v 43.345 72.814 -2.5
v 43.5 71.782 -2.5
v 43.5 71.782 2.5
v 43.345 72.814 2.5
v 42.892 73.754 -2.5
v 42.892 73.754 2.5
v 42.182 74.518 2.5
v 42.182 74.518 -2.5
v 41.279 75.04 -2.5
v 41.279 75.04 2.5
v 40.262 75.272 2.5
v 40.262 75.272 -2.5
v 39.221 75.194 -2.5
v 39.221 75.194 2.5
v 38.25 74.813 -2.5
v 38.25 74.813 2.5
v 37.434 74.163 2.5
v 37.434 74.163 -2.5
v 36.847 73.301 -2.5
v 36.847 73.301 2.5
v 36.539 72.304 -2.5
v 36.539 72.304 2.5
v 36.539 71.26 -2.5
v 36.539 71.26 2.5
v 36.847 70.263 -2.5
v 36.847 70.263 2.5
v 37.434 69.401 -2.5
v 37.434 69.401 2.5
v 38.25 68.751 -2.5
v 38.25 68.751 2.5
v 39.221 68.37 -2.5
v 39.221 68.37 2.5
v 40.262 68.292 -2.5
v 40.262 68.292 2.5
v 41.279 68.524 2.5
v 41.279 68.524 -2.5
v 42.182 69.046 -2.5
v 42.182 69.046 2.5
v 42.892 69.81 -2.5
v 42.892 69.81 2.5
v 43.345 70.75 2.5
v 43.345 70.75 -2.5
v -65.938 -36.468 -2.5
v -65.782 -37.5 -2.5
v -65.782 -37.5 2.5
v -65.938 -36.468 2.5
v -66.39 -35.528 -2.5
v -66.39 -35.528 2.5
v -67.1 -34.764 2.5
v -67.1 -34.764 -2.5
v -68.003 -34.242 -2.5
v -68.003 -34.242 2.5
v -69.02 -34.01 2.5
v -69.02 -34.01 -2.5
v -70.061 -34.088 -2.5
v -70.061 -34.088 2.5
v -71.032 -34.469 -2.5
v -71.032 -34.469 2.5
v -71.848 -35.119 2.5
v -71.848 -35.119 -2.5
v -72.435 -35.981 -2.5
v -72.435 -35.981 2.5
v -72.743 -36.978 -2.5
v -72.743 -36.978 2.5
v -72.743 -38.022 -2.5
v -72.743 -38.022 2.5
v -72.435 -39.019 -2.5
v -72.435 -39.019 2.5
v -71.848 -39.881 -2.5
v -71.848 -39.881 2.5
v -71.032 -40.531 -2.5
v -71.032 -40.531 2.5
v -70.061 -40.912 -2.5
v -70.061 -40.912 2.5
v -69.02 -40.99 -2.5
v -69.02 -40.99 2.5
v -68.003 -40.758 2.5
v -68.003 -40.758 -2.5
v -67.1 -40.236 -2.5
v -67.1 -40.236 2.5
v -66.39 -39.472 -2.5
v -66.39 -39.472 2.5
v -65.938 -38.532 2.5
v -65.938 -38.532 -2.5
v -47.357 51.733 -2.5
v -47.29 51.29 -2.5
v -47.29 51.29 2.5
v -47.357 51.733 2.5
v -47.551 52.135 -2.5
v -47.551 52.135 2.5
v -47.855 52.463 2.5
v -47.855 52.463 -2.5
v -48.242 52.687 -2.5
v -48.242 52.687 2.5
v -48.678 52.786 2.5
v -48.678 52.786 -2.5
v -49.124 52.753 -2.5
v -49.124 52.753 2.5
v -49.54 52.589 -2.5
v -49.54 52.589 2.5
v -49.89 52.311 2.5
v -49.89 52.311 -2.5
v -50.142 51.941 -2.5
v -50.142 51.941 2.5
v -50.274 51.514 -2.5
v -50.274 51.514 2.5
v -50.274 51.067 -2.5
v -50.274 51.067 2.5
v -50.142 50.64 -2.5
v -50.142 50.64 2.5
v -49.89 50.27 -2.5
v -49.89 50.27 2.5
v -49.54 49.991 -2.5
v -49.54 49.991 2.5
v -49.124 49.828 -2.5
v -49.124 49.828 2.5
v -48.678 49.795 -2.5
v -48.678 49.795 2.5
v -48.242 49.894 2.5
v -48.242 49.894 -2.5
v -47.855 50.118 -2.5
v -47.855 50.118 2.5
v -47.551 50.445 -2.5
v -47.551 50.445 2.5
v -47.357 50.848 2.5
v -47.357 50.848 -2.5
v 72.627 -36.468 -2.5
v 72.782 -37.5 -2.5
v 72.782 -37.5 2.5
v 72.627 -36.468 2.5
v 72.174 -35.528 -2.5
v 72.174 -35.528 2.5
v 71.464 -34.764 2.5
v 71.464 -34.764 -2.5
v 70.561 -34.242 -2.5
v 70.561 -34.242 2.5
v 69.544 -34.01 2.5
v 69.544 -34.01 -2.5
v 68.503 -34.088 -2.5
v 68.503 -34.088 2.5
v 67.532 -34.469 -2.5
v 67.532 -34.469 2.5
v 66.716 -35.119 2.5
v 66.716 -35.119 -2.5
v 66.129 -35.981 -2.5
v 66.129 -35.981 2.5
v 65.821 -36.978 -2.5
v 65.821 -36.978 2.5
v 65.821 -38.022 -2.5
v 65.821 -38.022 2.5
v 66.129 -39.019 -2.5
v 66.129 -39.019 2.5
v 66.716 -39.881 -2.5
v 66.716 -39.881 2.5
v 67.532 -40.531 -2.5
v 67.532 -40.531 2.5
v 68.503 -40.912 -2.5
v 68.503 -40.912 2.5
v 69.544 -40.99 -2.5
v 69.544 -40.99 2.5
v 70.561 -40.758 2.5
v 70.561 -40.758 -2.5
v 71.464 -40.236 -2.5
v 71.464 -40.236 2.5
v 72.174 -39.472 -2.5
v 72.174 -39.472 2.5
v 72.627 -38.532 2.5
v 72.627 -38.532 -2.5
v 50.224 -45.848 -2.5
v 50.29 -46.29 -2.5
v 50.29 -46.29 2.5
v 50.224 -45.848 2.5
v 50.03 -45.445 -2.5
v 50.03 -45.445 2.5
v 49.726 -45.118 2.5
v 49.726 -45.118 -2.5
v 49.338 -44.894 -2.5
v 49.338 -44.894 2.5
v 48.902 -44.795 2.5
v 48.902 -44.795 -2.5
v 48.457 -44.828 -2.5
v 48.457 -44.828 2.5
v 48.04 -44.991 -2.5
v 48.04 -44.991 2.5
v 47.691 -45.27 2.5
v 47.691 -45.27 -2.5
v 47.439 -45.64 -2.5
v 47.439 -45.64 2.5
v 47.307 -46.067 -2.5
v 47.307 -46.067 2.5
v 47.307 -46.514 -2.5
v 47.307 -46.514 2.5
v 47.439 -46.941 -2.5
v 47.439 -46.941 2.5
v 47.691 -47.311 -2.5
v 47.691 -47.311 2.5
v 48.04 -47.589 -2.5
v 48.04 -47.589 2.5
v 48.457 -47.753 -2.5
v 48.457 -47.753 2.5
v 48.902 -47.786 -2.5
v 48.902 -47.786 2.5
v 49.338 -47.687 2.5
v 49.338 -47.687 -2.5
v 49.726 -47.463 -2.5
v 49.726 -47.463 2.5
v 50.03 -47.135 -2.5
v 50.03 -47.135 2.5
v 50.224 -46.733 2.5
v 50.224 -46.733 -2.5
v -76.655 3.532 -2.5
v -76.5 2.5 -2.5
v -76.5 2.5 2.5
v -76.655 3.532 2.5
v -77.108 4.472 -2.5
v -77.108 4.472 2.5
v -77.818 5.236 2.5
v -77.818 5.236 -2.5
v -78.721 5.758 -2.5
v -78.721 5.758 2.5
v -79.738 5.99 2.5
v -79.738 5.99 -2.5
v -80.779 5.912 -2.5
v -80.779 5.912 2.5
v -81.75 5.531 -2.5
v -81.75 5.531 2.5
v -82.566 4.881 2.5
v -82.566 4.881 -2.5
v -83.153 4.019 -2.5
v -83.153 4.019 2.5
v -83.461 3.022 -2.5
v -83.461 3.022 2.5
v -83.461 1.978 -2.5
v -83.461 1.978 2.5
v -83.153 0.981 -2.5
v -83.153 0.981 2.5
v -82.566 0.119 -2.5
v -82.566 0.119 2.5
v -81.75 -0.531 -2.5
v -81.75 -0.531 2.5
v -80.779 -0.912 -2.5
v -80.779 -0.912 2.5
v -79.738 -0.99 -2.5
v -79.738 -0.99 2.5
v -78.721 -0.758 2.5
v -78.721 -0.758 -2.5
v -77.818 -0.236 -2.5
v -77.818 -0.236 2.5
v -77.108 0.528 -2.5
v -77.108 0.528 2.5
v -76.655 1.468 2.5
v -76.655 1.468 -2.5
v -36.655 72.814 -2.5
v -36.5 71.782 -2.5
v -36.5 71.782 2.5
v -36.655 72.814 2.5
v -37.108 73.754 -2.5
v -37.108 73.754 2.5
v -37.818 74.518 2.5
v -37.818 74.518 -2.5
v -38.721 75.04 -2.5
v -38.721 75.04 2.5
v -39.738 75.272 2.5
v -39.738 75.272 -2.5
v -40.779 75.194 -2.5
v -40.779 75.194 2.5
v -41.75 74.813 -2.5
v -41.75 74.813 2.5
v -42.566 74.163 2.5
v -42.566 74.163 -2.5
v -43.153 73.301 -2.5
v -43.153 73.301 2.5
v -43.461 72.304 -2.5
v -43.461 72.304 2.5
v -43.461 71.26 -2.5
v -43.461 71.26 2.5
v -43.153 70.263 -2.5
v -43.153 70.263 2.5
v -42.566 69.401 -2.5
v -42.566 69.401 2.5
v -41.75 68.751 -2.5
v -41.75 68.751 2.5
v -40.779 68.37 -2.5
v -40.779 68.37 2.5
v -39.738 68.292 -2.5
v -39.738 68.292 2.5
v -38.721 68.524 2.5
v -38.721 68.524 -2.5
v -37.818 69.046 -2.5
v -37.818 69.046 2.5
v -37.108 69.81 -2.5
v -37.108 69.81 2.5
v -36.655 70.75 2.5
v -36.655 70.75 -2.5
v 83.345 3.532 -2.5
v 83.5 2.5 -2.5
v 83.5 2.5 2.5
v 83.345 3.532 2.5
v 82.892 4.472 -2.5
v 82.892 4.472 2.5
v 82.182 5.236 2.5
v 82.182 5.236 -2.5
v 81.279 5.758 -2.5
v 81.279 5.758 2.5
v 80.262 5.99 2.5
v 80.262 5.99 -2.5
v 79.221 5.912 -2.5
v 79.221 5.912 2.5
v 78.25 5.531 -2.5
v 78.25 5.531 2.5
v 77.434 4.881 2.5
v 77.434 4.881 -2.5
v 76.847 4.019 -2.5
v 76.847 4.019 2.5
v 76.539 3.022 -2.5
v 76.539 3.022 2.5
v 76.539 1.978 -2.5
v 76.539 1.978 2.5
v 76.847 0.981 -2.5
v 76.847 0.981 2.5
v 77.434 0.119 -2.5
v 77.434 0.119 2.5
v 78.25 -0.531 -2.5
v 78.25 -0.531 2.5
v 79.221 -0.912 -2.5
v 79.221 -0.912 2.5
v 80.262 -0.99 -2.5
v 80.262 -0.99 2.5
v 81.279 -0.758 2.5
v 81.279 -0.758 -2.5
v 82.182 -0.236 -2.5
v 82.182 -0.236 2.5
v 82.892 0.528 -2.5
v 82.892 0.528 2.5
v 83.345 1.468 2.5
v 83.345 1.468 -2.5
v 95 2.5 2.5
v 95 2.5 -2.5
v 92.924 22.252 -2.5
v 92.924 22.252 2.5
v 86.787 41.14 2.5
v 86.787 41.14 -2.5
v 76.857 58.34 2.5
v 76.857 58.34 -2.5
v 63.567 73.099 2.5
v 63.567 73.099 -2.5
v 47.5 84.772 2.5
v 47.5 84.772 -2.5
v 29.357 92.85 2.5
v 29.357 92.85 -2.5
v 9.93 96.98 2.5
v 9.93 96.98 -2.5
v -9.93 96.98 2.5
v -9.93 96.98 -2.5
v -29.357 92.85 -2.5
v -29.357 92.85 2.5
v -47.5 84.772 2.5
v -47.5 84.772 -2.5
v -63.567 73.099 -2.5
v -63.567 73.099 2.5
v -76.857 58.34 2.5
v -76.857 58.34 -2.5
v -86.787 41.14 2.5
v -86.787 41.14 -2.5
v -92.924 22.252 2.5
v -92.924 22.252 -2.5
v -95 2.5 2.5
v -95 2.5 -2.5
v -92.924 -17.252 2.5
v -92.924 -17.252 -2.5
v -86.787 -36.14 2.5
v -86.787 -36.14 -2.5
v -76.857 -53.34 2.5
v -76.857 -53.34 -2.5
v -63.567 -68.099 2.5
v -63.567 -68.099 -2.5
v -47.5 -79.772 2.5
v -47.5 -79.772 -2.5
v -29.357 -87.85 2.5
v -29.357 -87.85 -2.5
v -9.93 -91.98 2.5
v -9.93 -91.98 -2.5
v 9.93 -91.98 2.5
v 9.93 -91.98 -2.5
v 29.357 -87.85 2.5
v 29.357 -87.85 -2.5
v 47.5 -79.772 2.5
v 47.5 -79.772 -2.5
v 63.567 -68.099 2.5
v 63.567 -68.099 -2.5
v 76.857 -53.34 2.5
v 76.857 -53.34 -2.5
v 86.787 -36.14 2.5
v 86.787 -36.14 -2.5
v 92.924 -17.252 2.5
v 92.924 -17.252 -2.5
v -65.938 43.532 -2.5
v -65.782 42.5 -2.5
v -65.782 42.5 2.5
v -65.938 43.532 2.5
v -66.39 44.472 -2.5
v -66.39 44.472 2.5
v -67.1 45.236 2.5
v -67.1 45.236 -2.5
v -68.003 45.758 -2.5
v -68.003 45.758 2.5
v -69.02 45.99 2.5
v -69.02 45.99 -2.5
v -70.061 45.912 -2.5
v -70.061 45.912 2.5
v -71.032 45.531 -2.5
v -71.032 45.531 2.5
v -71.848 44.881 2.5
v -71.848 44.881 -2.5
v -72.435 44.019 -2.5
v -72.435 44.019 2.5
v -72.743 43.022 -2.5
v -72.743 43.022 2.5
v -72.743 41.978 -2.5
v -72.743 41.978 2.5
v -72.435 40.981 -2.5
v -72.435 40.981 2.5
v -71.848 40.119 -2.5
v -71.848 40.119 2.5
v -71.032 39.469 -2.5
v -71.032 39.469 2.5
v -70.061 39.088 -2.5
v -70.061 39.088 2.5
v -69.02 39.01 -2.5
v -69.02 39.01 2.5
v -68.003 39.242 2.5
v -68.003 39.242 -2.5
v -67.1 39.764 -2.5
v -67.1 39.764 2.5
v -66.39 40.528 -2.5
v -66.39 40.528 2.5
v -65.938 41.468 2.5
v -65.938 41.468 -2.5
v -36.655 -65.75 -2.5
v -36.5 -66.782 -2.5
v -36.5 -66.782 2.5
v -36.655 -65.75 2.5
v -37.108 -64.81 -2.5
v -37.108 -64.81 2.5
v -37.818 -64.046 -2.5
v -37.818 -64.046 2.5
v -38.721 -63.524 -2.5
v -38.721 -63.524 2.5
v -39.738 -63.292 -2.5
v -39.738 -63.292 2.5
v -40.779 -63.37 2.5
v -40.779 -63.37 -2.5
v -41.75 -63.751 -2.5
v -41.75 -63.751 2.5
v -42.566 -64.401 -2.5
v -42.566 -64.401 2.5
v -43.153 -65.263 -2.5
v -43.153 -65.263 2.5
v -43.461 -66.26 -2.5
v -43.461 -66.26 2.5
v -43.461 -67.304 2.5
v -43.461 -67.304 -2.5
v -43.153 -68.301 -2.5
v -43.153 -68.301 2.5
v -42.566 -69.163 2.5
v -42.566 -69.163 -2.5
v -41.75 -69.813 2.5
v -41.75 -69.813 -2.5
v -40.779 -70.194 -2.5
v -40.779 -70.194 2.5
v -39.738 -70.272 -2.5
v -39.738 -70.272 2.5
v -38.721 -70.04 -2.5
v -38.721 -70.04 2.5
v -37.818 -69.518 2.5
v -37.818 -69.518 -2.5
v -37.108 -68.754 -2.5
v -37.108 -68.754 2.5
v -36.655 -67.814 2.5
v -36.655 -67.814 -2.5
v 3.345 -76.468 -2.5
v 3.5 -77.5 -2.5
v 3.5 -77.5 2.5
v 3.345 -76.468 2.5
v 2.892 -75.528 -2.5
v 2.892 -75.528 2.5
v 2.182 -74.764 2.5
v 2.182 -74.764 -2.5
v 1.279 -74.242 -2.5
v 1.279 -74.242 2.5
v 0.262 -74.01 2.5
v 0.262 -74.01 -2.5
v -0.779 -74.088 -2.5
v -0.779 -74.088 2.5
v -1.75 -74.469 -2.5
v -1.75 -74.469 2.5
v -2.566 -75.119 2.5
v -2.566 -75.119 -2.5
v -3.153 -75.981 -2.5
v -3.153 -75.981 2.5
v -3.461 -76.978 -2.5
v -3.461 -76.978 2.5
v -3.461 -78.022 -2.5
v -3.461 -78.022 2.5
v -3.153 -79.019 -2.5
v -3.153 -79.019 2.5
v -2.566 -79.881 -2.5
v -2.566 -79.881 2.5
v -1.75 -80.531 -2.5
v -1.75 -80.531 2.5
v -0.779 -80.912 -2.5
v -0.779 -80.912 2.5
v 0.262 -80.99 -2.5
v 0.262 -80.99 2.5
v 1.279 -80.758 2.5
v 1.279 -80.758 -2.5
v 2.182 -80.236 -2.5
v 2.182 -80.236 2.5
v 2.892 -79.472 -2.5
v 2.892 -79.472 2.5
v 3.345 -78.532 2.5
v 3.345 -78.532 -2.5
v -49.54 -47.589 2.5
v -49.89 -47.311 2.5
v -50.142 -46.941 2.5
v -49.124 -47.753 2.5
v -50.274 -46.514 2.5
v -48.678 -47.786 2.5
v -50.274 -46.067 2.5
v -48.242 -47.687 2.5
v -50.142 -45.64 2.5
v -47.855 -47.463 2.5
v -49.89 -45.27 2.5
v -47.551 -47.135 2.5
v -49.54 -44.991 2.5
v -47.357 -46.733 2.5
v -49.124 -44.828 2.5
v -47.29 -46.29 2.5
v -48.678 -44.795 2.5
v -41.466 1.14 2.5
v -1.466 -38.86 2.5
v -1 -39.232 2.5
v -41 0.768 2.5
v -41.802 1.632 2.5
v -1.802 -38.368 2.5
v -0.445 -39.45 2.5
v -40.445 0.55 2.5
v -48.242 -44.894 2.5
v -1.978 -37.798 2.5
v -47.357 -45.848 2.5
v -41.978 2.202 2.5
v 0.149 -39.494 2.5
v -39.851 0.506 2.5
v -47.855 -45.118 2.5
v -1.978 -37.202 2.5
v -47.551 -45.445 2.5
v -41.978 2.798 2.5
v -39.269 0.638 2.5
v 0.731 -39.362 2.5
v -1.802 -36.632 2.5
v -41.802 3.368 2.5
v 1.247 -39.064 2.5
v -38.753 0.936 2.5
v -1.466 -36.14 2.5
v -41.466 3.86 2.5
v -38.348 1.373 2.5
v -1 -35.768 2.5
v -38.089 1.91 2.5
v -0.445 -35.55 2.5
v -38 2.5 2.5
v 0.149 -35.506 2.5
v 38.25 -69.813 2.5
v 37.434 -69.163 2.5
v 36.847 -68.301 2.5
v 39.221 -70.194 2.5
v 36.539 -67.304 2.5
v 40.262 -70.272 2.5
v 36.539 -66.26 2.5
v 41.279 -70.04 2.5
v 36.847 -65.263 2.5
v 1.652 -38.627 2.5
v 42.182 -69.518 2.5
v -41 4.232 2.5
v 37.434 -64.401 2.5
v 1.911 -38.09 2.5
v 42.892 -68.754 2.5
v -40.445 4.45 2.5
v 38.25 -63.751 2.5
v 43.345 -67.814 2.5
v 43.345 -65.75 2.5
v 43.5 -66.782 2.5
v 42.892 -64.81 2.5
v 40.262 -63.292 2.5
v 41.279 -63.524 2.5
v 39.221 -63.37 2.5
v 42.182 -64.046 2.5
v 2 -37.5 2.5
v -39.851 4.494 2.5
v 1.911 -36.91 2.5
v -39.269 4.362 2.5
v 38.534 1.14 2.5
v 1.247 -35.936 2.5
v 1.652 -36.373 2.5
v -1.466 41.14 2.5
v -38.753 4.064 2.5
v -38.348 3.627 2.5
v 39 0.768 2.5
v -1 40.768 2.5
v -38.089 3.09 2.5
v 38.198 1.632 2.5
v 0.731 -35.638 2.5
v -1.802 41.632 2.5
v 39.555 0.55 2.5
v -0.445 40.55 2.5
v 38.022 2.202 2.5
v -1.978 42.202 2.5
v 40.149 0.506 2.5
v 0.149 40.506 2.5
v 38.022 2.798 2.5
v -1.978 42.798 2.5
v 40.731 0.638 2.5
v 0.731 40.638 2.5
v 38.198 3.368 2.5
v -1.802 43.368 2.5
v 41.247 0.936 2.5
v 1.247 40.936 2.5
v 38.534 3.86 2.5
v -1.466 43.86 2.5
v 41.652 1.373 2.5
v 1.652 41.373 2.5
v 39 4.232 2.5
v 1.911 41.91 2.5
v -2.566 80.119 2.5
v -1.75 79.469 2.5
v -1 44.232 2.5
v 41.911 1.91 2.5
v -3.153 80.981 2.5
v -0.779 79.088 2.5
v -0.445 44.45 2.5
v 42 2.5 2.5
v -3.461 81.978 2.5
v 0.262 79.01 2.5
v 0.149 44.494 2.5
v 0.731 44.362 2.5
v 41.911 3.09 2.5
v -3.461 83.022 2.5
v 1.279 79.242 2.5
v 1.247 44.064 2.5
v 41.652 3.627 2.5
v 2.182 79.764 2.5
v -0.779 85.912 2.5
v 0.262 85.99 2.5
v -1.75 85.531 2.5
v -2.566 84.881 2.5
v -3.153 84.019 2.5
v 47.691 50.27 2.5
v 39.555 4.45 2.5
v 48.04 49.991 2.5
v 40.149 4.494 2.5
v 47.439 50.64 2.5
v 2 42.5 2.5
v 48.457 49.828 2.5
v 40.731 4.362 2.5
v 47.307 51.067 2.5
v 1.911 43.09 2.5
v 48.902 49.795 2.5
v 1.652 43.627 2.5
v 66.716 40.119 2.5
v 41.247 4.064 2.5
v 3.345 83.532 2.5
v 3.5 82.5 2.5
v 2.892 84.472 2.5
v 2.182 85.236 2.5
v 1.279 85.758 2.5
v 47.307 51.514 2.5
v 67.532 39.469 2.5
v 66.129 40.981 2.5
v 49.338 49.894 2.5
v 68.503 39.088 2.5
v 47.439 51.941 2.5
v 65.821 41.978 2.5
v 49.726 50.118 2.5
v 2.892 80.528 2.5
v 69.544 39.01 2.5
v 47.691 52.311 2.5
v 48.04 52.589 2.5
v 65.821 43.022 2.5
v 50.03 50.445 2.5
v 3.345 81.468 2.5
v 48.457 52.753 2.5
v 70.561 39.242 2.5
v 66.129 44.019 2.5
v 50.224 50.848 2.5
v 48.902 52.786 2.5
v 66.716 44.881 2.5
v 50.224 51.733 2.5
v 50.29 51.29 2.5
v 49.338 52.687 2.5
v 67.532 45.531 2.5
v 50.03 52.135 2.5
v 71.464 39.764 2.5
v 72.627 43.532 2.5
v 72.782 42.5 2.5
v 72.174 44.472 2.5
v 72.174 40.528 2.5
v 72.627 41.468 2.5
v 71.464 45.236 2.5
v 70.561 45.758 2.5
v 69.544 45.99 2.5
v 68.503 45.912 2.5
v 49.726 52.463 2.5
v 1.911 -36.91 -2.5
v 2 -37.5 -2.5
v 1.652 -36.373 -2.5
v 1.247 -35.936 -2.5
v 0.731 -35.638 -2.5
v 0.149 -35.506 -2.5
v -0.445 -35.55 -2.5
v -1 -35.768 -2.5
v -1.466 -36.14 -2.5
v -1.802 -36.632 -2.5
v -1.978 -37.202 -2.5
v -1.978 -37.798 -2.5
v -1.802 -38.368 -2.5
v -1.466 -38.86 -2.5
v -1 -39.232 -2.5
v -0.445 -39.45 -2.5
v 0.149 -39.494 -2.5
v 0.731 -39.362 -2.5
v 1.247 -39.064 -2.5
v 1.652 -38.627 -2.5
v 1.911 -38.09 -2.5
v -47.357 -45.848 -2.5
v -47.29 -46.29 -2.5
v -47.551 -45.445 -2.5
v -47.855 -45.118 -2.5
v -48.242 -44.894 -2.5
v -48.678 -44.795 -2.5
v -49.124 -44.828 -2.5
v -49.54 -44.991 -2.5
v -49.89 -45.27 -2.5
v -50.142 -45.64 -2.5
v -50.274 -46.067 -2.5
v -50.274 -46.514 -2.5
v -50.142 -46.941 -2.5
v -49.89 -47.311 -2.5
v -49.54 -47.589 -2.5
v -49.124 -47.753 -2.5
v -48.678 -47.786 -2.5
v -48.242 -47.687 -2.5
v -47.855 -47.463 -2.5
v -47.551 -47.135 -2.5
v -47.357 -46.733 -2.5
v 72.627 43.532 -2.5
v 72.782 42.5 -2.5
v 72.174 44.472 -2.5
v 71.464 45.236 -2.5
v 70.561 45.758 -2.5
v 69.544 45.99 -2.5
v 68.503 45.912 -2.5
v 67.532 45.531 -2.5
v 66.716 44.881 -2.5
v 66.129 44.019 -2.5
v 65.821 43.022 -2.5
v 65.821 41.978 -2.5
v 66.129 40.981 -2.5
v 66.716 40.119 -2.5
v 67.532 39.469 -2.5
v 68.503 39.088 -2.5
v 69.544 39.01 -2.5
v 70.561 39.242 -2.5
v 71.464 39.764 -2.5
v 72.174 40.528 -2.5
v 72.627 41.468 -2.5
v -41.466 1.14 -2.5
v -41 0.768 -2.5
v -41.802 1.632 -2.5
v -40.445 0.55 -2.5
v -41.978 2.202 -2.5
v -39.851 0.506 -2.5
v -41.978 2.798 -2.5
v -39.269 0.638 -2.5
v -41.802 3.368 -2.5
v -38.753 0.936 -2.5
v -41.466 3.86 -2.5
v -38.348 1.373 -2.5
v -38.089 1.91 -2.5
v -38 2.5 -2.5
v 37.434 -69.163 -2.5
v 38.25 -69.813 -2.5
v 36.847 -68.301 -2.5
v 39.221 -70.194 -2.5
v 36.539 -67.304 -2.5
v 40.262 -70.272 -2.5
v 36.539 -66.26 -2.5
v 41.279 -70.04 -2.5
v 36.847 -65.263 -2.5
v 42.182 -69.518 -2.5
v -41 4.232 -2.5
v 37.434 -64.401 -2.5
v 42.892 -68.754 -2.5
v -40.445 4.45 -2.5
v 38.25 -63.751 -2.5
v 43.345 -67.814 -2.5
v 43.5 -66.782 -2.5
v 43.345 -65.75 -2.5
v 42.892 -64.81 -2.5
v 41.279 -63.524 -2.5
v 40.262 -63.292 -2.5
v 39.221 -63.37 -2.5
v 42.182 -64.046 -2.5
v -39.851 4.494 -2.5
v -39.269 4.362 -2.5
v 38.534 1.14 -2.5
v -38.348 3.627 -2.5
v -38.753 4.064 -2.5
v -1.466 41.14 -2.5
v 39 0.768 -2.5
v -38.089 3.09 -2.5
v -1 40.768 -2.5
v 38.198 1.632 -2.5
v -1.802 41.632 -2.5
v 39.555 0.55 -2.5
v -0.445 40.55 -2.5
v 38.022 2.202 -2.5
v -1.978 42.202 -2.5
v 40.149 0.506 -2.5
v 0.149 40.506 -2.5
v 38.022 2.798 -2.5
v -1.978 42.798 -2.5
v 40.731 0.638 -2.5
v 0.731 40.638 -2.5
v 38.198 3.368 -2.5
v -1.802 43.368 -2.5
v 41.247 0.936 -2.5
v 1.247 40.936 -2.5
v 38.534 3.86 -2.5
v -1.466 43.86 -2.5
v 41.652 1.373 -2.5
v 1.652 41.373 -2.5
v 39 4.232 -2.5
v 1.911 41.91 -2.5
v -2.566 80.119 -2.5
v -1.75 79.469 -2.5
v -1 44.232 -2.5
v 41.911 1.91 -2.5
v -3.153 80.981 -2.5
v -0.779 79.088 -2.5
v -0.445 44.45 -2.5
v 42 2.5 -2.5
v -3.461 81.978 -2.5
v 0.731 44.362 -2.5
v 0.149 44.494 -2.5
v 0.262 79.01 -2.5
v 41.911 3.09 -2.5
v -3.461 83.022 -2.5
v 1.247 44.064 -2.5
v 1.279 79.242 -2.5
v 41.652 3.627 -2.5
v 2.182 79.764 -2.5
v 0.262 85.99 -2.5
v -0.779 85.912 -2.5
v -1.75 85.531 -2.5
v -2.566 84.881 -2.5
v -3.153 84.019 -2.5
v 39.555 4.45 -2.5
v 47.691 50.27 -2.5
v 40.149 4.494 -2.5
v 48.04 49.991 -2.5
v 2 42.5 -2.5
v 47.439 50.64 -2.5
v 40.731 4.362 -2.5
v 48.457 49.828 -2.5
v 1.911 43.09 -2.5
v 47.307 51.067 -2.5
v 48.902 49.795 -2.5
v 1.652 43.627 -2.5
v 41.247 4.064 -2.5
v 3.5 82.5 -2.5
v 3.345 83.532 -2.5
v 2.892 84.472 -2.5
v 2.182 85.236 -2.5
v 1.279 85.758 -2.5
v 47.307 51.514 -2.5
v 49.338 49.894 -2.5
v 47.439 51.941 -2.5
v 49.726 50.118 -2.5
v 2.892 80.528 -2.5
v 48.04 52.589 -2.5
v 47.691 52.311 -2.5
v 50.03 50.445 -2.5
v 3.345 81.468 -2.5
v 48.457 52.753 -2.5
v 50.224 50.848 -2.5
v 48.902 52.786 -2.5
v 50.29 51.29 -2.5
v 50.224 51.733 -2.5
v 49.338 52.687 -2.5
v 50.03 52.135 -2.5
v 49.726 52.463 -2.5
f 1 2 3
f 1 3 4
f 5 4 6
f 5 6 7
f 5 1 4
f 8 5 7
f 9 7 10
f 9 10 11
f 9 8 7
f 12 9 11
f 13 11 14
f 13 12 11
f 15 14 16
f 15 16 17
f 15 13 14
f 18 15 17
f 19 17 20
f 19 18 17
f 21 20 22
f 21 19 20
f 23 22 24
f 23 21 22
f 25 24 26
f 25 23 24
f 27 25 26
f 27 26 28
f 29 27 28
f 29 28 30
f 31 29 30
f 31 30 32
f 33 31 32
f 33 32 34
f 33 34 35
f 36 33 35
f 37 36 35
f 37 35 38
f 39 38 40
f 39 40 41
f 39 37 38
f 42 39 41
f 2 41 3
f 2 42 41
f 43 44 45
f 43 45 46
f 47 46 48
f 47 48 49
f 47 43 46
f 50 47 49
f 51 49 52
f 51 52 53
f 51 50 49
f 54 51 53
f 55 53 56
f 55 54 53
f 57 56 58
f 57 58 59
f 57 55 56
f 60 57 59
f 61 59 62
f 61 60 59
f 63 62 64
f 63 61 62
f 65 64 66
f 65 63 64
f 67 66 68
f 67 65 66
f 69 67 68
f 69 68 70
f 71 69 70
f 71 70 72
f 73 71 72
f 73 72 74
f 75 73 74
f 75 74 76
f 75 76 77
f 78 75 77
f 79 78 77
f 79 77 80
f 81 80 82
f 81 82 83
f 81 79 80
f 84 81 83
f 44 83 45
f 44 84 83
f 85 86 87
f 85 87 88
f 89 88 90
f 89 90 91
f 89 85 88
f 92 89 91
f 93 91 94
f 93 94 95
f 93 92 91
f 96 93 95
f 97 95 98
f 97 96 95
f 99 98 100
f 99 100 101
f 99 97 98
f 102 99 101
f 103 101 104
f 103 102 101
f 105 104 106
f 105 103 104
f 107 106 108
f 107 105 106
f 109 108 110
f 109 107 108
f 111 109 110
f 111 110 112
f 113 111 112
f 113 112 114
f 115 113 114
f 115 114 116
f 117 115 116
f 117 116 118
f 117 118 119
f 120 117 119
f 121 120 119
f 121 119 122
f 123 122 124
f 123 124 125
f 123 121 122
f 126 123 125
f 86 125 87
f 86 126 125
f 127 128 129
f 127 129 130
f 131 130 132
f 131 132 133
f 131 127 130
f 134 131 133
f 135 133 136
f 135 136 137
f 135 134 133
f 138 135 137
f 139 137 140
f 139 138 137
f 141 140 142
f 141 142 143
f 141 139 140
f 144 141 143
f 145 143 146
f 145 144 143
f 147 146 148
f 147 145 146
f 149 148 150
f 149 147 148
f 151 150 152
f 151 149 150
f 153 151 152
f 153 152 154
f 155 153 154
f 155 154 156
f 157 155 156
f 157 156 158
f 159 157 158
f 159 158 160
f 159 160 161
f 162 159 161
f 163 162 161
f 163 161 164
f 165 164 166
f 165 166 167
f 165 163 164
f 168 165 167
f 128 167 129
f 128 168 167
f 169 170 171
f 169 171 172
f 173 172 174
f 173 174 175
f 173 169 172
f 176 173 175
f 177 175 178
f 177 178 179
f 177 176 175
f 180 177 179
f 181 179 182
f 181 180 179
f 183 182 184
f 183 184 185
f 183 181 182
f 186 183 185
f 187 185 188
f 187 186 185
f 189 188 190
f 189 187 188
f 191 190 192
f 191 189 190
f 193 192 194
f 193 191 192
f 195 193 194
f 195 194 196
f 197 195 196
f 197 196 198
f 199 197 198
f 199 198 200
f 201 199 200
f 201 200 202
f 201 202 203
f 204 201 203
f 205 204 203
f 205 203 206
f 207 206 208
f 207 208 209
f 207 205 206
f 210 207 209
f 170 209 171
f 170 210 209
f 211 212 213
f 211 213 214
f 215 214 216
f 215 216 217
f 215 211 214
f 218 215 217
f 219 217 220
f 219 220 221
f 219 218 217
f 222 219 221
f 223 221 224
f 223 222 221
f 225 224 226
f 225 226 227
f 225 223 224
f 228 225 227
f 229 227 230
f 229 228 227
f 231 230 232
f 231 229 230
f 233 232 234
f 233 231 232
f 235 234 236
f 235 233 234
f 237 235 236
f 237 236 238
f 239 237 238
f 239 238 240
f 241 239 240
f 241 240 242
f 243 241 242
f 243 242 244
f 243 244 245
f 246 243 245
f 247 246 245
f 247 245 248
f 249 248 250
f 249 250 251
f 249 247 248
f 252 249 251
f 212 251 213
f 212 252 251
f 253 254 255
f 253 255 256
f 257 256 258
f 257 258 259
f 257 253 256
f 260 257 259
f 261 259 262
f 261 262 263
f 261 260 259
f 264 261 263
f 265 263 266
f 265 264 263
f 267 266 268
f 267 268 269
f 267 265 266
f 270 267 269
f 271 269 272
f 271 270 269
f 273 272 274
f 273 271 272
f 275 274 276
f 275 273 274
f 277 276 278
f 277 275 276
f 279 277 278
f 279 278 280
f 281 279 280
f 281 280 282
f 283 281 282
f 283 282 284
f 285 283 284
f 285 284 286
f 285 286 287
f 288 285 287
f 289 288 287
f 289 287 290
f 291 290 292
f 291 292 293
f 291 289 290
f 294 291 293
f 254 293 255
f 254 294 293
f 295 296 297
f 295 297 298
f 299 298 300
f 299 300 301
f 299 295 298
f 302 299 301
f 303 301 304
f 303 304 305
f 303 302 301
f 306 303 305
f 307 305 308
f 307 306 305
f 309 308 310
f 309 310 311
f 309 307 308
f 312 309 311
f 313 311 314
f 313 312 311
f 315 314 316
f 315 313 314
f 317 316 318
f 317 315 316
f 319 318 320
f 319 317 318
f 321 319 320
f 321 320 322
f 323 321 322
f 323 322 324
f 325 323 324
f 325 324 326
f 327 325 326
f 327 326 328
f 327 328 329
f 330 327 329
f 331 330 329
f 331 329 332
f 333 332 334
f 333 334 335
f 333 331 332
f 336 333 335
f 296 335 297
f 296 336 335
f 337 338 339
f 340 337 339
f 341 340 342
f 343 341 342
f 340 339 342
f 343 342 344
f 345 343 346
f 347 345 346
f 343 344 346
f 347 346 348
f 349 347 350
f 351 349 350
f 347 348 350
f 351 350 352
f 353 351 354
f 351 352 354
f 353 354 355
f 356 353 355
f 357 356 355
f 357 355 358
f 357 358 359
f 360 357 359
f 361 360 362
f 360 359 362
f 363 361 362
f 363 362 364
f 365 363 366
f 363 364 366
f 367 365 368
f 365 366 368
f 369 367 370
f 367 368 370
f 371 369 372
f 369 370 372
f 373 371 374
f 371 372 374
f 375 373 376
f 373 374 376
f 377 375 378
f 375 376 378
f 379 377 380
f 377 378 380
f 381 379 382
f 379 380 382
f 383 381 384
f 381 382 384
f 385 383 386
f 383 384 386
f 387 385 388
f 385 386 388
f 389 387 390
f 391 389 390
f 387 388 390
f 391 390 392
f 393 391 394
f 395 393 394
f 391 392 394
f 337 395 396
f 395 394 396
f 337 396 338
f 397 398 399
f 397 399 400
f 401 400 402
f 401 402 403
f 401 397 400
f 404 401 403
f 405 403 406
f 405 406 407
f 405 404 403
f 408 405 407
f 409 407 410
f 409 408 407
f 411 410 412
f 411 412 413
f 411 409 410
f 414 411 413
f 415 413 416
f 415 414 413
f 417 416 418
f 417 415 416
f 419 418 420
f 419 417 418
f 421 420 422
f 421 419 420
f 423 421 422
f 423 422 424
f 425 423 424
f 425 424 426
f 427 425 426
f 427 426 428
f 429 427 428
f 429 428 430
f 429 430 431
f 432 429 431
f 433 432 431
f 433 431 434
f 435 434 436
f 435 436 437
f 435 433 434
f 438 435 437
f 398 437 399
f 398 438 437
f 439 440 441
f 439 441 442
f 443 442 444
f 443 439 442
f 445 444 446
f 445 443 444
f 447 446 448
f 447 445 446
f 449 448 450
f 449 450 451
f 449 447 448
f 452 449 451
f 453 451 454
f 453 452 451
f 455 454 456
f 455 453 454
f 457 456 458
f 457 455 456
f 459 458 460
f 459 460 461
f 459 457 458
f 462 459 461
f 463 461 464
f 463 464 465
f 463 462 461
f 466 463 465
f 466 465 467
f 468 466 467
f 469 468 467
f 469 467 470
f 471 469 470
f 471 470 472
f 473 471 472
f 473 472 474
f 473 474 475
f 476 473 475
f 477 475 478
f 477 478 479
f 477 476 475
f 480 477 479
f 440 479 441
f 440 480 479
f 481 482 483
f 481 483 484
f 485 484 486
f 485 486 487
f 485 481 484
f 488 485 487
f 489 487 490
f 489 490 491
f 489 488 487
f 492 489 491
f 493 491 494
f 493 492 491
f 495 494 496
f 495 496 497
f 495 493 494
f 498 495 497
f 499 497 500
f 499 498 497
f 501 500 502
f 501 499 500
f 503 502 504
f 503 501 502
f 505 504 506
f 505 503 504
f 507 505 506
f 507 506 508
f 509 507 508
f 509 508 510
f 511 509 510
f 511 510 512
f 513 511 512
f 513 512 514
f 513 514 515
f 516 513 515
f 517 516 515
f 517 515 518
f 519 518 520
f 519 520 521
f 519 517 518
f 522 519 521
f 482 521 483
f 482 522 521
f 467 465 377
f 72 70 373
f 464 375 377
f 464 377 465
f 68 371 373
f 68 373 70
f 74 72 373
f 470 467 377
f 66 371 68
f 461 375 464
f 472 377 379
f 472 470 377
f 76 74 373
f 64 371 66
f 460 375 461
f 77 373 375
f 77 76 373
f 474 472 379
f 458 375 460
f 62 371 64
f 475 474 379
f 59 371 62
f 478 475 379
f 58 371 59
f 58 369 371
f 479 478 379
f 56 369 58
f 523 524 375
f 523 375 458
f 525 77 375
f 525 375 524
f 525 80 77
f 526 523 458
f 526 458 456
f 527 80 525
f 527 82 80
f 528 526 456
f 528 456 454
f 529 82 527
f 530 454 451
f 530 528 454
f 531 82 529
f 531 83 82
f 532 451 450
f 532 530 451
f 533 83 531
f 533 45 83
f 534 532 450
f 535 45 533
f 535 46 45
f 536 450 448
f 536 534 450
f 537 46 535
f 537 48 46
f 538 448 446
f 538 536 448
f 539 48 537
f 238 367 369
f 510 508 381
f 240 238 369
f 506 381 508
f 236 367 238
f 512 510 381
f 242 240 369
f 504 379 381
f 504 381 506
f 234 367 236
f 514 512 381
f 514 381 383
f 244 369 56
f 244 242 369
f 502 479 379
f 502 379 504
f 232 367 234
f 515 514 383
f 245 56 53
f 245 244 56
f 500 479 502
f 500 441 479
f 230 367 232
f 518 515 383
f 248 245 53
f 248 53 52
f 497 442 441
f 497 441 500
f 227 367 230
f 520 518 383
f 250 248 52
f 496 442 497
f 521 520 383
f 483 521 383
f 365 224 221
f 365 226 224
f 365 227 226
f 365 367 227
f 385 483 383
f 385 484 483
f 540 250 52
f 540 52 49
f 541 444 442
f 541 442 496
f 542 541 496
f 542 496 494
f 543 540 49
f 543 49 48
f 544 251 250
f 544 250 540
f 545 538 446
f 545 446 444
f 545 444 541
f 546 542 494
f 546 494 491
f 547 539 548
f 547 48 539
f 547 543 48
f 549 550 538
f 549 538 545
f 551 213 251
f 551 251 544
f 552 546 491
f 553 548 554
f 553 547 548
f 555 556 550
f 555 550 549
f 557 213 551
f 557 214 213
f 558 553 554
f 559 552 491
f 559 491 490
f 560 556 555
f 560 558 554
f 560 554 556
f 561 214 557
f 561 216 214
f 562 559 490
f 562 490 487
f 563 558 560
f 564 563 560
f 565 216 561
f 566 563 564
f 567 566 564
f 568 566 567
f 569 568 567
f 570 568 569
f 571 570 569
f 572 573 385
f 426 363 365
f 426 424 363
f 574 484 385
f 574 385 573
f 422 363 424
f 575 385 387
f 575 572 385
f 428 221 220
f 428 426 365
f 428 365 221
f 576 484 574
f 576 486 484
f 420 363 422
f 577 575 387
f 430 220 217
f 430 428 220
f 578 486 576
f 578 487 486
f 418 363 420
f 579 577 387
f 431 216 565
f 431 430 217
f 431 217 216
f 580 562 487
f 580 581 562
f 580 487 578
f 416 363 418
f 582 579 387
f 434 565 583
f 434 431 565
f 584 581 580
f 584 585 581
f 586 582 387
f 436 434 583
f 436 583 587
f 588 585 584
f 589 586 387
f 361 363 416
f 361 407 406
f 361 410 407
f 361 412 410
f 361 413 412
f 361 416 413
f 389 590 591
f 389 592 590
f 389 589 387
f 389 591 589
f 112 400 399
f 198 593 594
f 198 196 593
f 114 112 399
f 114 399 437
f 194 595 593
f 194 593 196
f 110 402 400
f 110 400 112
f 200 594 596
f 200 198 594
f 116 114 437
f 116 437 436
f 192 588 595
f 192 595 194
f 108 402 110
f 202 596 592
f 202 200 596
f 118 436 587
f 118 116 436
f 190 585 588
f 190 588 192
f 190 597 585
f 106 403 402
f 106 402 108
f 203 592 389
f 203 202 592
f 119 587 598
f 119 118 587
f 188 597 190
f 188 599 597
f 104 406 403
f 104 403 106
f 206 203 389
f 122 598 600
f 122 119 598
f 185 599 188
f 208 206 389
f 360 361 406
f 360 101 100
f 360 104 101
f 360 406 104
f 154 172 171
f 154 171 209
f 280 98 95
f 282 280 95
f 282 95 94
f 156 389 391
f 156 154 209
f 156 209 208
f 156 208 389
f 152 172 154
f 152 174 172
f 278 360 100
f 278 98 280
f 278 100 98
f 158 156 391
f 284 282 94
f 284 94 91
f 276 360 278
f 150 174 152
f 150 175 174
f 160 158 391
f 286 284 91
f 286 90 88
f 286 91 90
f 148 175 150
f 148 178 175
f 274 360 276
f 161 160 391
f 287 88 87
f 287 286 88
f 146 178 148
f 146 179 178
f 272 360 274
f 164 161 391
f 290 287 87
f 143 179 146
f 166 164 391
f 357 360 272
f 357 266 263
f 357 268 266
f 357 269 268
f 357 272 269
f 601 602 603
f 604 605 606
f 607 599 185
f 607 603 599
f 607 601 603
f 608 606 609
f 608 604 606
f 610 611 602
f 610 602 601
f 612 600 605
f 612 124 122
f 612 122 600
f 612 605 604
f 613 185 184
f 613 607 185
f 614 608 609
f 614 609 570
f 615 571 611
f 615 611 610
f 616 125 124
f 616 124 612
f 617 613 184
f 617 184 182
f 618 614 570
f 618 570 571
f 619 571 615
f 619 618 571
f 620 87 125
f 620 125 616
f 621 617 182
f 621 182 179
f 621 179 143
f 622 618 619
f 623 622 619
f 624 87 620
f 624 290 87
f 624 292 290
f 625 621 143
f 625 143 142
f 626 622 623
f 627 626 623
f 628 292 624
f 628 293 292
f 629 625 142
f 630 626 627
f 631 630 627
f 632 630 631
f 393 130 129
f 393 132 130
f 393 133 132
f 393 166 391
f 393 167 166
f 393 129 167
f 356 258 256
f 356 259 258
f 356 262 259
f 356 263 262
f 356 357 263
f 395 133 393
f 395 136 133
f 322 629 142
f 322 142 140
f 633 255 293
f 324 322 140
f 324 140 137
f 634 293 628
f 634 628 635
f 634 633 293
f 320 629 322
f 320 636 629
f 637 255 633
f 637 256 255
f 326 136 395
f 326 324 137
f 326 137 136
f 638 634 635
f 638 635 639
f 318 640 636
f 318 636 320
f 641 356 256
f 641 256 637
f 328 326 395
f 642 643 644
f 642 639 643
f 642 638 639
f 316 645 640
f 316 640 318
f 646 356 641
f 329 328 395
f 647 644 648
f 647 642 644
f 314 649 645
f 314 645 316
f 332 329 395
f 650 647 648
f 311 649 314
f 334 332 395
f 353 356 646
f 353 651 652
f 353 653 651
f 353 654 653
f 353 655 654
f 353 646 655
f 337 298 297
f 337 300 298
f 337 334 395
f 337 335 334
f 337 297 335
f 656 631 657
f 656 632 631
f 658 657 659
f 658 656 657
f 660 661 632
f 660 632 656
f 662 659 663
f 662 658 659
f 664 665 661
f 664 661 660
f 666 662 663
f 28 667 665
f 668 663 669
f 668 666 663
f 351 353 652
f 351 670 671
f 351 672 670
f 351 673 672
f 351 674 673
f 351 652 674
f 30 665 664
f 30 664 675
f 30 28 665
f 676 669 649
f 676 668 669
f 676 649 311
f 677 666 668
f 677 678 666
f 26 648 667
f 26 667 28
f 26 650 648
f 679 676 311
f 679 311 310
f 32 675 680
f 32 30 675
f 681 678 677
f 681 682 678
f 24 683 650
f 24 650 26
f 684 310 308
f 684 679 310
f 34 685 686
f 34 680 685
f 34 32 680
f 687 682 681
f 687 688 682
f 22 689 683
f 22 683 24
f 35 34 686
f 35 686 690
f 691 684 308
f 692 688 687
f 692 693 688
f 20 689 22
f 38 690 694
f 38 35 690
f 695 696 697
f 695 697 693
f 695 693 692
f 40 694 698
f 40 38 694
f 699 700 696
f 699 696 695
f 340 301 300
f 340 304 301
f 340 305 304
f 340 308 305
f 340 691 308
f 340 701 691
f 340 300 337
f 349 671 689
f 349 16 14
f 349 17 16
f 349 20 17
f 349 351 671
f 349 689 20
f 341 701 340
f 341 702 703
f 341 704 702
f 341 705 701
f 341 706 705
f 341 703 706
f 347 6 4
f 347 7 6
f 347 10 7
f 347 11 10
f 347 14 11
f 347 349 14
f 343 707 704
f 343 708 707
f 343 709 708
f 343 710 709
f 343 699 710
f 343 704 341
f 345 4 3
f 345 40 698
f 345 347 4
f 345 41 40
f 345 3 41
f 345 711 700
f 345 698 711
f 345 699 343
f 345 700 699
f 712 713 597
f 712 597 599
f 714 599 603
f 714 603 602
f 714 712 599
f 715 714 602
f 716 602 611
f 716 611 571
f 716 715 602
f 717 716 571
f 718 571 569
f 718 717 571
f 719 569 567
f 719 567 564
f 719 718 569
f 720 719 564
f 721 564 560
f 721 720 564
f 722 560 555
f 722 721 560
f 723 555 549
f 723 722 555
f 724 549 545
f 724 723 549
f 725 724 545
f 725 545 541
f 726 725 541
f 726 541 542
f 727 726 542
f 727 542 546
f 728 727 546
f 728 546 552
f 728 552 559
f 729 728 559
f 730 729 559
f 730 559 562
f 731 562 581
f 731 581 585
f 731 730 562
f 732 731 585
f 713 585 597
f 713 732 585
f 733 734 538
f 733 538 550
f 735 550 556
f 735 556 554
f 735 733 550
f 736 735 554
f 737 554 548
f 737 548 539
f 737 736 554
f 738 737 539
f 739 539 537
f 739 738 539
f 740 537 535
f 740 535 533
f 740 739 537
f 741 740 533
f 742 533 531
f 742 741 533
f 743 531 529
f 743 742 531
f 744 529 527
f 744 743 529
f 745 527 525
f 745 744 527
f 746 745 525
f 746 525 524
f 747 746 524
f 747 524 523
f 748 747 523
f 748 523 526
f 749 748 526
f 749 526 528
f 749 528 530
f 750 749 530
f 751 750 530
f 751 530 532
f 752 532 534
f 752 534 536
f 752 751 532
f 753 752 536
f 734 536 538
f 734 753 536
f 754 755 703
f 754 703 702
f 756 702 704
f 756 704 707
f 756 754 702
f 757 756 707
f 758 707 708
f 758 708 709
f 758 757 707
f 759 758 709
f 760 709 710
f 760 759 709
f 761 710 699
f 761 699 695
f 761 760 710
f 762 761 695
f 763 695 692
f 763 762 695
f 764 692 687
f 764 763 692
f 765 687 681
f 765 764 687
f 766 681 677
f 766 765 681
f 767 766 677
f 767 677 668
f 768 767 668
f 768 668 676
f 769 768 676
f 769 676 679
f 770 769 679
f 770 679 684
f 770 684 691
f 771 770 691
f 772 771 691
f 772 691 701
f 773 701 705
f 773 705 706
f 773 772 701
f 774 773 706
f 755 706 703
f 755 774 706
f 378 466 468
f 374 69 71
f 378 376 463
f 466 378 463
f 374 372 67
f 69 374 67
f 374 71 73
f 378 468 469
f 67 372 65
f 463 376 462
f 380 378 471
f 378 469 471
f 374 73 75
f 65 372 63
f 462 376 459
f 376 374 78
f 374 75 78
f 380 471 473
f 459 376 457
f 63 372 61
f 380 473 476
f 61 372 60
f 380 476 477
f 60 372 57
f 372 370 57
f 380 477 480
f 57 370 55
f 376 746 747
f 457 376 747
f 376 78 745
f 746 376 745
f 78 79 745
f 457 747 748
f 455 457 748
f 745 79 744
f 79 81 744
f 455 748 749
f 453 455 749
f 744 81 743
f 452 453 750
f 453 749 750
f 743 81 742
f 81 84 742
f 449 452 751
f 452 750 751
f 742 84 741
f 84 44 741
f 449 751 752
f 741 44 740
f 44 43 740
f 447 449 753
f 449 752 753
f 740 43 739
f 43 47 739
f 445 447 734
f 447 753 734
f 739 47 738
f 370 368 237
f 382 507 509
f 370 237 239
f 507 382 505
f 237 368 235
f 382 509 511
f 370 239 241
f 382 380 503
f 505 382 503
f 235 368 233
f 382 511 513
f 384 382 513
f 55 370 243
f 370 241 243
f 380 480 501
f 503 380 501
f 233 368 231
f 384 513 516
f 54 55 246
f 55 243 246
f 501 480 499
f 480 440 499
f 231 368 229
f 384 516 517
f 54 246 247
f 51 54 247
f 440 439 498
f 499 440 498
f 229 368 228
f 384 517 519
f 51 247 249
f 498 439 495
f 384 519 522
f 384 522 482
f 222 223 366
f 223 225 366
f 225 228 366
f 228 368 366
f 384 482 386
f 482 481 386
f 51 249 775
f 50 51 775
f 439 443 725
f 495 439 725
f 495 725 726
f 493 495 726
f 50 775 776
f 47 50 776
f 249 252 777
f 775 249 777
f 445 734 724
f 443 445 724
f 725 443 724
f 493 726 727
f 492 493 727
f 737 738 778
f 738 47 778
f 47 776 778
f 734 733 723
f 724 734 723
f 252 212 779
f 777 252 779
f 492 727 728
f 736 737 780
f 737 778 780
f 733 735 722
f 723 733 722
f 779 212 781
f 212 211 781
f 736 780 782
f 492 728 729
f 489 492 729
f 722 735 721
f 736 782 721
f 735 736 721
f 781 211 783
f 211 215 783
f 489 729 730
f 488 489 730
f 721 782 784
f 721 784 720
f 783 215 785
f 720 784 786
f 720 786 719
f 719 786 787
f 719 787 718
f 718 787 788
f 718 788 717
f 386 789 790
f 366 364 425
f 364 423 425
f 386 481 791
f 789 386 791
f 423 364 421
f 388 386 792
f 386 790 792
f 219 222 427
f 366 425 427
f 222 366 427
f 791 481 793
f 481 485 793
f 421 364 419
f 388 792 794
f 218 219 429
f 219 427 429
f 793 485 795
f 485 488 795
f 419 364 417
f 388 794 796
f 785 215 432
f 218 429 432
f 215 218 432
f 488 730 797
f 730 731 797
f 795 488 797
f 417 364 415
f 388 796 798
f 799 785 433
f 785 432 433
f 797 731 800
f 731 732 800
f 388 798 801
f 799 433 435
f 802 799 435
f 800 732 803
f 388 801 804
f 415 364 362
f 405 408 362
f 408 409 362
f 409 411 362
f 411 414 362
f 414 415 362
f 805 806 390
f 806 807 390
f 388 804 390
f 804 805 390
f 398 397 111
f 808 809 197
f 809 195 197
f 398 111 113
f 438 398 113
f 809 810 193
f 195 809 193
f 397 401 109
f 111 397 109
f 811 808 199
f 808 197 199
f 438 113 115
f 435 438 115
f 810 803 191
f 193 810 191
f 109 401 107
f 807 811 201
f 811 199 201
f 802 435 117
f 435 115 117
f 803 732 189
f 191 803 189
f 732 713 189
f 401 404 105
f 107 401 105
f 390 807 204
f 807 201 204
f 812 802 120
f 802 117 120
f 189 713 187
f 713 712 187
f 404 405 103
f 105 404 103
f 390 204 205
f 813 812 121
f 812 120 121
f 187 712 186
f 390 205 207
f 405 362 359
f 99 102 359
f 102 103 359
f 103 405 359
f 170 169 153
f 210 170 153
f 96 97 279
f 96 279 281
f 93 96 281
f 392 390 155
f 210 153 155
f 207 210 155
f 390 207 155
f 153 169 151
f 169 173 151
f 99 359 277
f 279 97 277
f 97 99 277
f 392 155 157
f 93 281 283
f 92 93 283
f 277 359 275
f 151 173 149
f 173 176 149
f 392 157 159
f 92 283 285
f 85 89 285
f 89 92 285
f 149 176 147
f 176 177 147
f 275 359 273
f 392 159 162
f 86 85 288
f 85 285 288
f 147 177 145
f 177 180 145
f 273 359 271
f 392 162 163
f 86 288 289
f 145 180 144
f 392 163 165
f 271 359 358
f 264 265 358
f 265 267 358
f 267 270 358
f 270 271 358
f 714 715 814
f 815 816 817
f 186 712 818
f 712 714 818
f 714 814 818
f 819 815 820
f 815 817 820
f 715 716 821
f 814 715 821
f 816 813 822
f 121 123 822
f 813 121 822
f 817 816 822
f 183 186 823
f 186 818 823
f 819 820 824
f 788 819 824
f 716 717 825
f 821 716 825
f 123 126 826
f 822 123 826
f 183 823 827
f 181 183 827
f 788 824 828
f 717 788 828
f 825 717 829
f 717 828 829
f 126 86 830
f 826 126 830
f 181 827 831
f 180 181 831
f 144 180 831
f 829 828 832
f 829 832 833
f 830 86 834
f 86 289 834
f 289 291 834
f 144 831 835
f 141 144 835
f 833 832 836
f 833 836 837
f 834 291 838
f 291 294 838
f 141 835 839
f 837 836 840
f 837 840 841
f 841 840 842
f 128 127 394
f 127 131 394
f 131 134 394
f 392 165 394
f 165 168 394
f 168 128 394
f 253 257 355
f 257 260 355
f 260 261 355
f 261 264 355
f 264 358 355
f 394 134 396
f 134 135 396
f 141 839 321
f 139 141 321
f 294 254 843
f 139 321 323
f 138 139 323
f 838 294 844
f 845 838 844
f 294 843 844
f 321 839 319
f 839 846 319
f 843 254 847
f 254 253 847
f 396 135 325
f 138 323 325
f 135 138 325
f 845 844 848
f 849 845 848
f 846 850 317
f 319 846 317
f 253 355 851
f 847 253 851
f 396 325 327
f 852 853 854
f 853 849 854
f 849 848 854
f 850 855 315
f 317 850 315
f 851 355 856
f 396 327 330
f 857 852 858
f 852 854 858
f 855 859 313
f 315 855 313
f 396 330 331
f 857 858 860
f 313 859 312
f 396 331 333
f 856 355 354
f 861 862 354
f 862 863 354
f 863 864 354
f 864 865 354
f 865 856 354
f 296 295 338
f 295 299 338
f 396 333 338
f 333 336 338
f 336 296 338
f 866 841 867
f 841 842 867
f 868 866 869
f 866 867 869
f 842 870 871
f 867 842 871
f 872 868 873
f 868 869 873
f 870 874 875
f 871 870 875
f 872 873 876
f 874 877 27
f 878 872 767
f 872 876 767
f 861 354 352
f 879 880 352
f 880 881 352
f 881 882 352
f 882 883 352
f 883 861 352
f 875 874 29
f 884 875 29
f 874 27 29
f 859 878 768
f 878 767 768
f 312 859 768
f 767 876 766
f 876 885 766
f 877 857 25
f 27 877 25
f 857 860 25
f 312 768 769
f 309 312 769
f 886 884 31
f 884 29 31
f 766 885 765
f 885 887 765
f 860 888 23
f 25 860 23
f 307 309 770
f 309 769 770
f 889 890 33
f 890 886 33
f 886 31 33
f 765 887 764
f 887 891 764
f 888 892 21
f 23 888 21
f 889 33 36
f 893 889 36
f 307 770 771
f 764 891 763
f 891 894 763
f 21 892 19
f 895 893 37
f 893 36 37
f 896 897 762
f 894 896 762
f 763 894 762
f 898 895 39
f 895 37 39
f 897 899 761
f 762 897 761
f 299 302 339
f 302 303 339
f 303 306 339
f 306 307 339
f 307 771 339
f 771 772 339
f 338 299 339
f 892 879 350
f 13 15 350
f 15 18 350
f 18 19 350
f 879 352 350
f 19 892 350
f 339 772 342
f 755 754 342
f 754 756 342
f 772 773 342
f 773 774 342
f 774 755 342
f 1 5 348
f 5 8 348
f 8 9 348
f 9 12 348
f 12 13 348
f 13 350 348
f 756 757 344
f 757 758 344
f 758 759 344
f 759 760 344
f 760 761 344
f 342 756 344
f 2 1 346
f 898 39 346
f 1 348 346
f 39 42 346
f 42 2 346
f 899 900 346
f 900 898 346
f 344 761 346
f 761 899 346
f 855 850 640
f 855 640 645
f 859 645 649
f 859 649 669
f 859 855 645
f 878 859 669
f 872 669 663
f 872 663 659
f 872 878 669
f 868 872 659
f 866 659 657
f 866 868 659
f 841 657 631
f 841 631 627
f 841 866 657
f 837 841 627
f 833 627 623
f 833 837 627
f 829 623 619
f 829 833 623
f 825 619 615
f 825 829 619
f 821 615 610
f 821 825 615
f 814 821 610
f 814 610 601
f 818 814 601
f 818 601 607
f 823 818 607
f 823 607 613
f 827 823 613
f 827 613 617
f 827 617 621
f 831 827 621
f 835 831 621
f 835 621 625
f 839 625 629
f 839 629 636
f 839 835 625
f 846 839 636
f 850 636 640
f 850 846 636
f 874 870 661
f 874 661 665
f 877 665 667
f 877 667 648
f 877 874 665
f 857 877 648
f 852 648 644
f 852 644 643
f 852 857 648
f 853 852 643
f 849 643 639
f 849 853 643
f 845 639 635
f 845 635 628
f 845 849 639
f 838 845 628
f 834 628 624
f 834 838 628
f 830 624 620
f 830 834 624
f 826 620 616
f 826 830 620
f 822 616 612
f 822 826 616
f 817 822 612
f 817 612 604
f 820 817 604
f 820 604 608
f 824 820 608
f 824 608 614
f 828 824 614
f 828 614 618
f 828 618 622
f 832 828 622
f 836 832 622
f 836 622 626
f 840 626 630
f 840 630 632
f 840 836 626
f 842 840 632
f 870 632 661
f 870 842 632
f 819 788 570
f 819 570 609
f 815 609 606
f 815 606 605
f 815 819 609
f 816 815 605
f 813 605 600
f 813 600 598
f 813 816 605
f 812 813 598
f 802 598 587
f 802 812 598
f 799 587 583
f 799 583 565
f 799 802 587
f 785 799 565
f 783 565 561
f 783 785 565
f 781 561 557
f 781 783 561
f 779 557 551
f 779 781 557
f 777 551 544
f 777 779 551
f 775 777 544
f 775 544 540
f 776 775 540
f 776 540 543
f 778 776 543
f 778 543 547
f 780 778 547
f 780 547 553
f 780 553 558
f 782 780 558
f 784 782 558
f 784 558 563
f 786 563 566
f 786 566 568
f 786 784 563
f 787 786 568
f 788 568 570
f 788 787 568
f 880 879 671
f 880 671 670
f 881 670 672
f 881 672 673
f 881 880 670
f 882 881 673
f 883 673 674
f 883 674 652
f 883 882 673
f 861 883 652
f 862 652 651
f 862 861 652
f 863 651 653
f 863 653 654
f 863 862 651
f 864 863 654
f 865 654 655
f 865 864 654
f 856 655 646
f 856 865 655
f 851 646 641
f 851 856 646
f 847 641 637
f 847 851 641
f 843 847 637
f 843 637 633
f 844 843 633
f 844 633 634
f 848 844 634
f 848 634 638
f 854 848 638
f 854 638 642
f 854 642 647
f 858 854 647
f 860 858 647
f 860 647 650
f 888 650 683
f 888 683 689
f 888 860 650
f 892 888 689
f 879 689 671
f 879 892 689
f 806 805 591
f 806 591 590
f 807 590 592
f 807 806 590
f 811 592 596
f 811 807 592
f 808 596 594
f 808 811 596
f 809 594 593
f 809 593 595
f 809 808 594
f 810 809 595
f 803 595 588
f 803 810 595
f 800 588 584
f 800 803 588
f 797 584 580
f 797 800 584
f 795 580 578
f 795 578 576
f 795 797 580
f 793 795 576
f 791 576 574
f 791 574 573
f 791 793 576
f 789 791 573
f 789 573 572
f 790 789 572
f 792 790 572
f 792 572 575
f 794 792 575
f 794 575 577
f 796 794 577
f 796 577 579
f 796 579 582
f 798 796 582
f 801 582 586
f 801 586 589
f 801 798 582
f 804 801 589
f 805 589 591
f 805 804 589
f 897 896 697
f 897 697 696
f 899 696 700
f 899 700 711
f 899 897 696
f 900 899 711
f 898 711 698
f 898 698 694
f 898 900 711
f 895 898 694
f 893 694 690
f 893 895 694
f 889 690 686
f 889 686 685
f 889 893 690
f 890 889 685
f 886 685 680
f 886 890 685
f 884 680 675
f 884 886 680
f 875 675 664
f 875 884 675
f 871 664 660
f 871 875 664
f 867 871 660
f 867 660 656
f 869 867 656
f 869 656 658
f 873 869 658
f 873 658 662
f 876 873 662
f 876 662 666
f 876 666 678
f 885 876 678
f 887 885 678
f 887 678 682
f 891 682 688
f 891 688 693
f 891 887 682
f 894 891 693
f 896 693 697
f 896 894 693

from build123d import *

# Parameters (mm, degrees)
SKETCH1_R             = 95
SKETCH1_R_2           = 1.5
SKETCH1_R_3           = 2
SKETCH1_R_4           = 3.5
BOSS_EXTRUDE1_DEPTH   = 5
BODY_MOVE_COPY1_ANGLE = 90


with BuildPart() as part:
    # Sketch1 → Boss-Extrude1 (new body)
    with BuildSketch(Plane(origin=(0, 0, 0), x_dir=(1, 0, 0), z_dir=(0, 1, 0))):
        Circle(SKETCH1_R)
        with Locations((48.790367902, 48.790367902)):
            Circle(SKETCH1_R_2, mode=Mode.SUBTRACT)
        with Locations((0, 40)):
            Circle(SKETCH1_R_3, mode=Mode.SUBTRACT)
        with Locations((40, 0)):
            Circle(SKETCH1_R_3, mode=Mode.SUBTRACT)
        with Locations((0, -40)):
            Circle(SKETCH1_R_3, mode=Mode.SUBTRACT)
        with Locations((-40, 0)):
            Circle(SKETCH1_R_3, mode=Mode.SUBTRACT)
        with Locations((48.790367902, -48.790367902)):
            Circle(SKETCH1_R_2, mode=Mode.SUBTRACT)
        with Locations((-48.790367902, -48.790367902)):
            Circle(SKETCH1_R_2, mode=Mode.SUBTRACT)
        with Locations((-48.790367902, 48.790367902)):
            Circle(SKETCH1_R_2, mode=Mode.SUBTRACT)
        with Locations((80, 0)):
            Circle(SKETCH1_R_4, mode=Mode.SUBTRACT)
        with Locations((69.282032303, -40)):
            Circle(SKETCH1_R_4, mode=Mode.SUBTRACT)
        with Locations((40, -69.282032303)):
            Circle(SKETCH1_R_4, mode=Mode.SUBTRACT)
        with Locations((0, -80)):
            Circle(SKETCH1_R_4, mode=Mode.SUBTRACT)
        with Locations((-40, -69.282032303)):
            Circle(SKETCH1_R_4, mode=Mode.SUBTRACT)
        with Locations((-69.282032303, -40)):
            Circle(SKETCH1_R_4, mode=Mode.SUBTRACT)
        with Locations((-80, 0)):
            Circle(SKETCH1_R_4, mode=Mode.SUBTRACT)
        with Locations((-69.282032303, 40)):
            Circle(SKETCH1_R_4, mode=Mode.SUBTRACT)
        with Locations((-40, 69.282032303)):
            Circle(SKETCH1_R_4, mode=Mode.SUBTRACT)
        with Locations((0, 80)):
            Circle(SKETCH1_R_4, mode=Mode.SUBTRACT)
        with Locations((40, 69.282032303)):
            Circle(SKETCH1_R_4, mode=Mode.SUBTRACT)
        with Locations((69.282032303, 40)):
            Circle(SKETCH1_R_4, mode=Mode.SUBTRACT)
    extrude(amount=BOSS_EXTRUDE1_DEPTH)


with BuildPart() as part_1:
    # Body-Move/Copy1: moved
    add(part.part.rotate(Axis((0, 2.5, 0), (1, 0, 0)), BODY_MOVE_COPY1_ANGLE))


solid = part_1.part
